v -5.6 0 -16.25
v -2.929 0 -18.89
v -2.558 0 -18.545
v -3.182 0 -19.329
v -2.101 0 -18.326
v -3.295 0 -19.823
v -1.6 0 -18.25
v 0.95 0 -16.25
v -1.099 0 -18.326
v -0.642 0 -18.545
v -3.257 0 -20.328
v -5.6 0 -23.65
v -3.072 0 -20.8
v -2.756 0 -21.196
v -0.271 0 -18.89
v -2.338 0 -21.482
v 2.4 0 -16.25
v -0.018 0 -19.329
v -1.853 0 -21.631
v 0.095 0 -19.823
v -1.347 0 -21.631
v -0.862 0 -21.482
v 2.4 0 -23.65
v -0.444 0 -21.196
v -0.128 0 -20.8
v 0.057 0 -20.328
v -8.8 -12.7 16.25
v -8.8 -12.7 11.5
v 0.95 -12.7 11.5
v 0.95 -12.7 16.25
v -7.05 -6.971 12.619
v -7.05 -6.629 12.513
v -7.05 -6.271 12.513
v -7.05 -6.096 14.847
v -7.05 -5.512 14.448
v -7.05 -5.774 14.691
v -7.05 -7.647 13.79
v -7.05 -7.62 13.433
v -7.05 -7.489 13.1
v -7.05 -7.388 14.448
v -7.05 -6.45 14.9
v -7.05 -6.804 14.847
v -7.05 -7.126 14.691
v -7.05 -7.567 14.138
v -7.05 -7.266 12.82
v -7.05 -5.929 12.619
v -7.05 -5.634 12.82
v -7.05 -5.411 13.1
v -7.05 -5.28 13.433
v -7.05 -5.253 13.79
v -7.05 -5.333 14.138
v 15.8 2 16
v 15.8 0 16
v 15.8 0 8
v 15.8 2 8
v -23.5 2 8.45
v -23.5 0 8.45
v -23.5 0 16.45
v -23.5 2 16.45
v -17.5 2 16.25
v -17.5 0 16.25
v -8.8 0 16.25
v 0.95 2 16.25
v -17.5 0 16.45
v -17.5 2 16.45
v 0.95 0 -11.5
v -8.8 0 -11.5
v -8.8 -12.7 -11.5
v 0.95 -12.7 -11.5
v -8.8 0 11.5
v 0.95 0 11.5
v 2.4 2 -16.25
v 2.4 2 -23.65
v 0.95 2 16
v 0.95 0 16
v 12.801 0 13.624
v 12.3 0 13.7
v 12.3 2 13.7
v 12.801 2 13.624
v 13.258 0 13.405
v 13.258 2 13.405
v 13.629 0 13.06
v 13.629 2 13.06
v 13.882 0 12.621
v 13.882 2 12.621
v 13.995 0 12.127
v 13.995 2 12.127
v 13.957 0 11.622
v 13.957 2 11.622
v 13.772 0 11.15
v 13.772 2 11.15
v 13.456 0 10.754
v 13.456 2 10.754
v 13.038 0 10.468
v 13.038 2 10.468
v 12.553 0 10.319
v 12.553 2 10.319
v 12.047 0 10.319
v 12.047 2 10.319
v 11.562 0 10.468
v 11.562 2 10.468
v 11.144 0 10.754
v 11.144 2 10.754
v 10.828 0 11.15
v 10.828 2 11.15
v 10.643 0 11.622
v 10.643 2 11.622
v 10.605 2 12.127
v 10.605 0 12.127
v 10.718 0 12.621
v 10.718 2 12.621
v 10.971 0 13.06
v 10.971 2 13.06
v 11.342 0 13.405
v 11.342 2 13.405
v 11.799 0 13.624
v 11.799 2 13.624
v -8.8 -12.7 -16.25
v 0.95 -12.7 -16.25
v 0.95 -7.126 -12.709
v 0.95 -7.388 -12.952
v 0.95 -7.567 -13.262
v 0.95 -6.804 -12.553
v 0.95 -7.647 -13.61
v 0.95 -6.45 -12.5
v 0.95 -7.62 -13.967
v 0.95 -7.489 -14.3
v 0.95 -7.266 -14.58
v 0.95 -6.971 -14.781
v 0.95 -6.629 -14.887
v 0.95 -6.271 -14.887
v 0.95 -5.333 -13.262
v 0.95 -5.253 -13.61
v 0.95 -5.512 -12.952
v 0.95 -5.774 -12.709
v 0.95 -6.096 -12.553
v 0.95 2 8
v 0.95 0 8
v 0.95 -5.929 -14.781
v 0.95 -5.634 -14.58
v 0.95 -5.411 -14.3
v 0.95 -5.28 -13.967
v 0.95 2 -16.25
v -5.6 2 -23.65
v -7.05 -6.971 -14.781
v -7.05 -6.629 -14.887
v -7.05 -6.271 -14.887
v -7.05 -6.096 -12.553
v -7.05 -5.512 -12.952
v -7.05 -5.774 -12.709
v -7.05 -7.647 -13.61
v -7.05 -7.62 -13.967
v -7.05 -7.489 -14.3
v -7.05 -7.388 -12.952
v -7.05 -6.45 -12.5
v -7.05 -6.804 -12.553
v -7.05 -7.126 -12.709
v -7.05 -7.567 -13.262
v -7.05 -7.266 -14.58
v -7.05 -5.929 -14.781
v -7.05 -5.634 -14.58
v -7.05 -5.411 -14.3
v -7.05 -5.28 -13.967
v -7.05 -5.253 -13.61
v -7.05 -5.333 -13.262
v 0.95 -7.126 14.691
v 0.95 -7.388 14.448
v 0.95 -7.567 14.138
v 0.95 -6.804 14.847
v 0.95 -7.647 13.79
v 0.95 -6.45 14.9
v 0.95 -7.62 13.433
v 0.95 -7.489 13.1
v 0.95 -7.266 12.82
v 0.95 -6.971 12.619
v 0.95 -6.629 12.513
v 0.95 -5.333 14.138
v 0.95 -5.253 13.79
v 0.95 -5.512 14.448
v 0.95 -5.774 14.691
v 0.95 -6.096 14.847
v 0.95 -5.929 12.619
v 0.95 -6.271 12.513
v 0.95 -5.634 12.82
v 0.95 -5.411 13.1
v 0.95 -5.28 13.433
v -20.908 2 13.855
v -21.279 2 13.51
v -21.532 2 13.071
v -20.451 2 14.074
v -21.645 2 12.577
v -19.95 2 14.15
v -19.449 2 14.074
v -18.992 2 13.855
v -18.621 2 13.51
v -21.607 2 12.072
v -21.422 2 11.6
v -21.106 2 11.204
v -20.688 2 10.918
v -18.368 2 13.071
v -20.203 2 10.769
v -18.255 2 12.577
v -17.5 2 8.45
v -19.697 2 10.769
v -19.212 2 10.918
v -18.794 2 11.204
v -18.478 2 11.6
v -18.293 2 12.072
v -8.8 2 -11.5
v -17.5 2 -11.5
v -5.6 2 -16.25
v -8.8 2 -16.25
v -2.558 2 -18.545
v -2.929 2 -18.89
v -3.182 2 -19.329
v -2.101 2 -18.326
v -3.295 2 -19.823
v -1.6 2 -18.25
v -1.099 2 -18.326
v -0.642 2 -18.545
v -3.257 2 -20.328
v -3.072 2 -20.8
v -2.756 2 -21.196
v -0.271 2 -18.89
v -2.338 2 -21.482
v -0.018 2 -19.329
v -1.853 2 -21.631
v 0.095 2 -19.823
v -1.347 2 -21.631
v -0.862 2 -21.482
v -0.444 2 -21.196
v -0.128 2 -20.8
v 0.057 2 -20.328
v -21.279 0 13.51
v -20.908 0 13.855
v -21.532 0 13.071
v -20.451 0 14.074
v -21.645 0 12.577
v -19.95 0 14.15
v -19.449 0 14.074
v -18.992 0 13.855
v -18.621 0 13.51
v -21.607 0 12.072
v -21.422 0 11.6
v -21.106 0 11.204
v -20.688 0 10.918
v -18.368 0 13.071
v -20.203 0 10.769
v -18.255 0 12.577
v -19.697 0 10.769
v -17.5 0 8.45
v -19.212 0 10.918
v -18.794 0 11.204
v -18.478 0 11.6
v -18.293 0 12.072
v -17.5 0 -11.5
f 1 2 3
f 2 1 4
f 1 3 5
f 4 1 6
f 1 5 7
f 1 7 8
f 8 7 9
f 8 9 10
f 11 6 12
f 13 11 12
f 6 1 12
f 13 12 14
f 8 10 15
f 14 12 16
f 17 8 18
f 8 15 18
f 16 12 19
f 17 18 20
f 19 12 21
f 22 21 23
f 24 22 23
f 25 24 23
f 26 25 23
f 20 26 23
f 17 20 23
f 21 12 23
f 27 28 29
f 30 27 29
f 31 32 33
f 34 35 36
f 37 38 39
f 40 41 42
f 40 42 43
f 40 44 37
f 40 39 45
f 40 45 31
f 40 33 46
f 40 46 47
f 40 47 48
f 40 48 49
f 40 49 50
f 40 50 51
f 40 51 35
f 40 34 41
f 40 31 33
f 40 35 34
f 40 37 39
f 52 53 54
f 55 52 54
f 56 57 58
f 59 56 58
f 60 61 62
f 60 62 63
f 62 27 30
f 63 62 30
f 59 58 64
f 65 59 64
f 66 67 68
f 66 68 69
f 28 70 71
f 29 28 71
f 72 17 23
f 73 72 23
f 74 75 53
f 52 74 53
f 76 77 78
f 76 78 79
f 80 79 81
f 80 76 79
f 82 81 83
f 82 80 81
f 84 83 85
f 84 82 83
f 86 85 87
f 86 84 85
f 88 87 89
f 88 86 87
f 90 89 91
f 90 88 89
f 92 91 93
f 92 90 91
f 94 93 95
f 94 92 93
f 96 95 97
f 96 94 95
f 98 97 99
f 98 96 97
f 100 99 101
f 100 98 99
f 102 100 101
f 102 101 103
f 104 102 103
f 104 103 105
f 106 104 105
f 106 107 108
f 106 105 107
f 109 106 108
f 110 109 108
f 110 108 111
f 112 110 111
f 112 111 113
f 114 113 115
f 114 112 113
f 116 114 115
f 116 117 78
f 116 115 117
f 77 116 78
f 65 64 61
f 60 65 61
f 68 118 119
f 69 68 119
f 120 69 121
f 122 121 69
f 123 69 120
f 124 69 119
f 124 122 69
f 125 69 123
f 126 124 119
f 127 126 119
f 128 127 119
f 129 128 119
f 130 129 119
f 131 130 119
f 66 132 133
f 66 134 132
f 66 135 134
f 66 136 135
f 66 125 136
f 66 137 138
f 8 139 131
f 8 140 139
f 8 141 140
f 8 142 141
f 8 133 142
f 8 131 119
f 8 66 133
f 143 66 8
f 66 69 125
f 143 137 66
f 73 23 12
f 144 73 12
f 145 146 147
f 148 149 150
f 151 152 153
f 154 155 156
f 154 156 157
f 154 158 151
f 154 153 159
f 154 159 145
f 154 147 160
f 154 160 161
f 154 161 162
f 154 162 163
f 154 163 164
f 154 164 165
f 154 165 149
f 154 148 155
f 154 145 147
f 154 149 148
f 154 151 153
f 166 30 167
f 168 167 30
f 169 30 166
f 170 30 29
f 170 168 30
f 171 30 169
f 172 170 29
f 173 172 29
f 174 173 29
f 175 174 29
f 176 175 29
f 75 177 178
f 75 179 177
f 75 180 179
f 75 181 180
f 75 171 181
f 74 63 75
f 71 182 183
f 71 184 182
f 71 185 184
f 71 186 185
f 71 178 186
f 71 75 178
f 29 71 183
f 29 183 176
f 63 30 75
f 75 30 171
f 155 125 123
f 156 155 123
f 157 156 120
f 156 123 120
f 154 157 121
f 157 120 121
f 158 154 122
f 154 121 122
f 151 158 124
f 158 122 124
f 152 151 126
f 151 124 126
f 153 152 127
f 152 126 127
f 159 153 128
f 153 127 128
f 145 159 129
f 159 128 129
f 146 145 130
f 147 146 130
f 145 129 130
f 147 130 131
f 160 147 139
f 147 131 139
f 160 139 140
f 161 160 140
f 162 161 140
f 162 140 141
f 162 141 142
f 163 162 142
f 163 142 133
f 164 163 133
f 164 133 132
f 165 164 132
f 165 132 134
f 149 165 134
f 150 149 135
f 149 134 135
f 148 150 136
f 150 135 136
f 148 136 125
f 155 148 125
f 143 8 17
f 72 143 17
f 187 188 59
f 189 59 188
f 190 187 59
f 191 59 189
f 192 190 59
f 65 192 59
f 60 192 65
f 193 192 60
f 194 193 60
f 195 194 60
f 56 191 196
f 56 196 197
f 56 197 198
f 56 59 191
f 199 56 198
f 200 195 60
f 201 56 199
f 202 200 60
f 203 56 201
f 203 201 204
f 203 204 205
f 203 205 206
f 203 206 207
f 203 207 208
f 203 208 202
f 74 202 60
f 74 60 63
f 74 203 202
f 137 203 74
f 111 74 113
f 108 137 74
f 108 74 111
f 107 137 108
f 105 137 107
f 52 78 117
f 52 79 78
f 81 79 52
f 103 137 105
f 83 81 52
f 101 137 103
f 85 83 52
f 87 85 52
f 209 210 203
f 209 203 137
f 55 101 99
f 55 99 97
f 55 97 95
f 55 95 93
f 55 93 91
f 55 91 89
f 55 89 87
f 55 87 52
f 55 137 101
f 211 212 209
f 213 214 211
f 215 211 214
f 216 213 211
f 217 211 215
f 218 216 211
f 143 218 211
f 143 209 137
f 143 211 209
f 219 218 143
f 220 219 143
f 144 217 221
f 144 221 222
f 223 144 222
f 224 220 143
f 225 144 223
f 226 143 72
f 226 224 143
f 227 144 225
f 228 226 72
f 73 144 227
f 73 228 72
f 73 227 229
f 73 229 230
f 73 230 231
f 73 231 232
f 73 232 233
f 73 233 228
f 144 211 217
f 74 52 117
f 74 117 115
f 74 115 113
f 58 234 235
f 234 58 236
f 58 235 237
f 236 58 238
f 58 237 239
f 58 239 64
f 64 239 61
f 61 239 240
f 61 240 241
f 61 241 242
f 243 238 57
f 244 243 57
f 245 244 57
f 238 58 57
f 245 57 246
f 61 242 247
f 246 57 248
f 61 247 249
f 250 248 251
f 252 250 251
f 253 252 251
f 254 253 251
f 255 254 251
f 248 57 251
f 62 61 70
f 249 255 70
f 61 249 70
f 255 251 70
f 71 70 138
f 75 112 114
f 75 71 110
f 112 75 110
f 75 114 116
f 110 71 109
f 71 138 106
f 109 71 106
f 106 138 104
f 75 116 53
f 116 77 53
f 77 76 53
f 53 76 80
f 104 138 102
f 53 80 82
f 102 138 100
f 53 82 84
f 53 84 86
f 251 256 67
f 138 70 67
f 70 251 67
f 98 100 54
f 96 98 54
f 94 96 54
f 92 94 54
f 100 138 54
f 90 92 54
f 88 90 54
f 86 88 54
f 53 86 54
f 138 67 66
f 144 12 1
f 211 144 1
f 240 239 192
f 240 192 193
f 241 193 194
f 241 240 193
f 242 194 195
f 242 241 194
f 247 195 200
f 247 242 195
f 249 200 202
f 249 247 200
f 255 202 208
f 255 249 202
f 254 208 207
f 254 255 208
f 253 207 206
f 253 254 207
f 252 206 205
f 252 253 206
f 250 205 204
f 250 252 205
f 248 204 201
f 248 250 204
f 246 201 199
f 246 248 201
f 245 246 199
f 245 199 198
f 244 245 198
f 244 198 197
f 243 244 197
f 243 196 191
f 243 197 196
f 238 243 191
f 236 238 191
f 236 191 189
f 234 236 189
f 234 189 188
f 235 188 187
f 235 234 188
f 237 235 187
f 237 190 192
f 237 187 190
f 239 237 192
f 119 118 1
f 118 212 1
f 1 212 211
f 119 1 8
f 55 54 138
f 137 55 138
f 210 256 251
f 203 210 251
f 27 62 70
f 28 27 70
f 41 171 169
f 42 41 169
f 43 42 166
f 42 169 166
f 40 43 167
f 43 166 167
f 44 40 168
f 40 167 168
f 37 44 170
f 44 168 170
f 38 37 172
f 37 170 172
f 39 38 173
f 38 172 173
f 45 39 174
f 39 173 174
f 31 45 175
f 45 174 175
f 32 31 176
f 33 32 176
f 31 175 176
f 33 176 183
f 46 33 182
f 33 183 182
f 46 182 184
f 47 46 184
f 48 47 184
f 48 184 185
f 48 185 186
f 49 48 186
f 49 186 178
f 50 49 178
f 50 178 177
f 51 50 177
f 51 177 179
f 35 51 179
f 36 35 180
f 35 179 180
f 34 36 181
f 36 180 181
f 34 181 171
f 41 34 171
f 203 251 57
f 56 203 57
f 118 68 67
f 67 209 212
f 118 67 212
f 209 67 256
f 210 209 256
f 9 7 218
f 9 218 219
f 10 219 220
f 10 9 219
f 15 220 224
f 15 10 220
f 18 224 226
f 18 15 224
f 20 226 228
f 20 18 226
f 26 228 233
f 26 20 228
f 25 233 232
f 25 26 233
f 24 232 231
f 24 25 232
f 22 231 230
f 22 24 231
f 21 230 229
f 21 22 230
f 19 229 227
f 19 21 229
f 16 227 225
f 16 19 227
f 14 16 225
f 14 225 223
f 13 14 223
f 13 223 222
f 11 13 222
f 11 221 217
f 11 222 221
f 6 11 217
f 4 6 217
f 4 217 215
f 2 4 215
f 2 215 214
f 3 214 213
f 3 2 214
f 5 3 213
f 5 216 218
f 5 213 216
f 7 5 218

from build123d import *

# Parameters (mm, degrees)
BOSS_EXTRUDE1_DEPTH     = 2
SKETCH1_5_W             = 9.75
SKETCH1_5_H             = 4.75
BOSS_EXTRUDE2_DEPTH     = 12.7
CUT_EXTRUDE1_DEPTH      = 36.677198601
CUT_EXTRUDE1_DEPTH_BACK = 36.677198601
SKETCH1_6_R             = 1.7
CUT_EXTRUDE2_START      = 0.95
SKETCH2_R               = 1.2
CUT_EXTRUDE2_DEPTH      = 8


with BuildPart() as part:
    # Sketch1 → Boss-Extrude1 (new body)
    with BuildSketch(Plane(origin=(0, 0, 0), x_dir=(1, 0, 0), z_dir=(0, 1, 0))):
        Polygon((0.95, 16.25), (2.4, 16.25), (2.4, 23.65), (-5.6, 23.65), (-5.6, 16.25), (-8.8, 16.25), (-8.8, 11.5), (-17.5, 11.5), (-17.5, -8.45), (-23.5, -8.45), (-23.5, -16.45), (-17.5, -16.45), (-17.5, -16.25), (0.95, -16.25), (0.95, -16), (15.8, -16), (15.8, -8), (0.95, -8), align=None)
    extrude(amount=BOSS_EXTRUDE1_DEPTH)

    # Sketch1<5> → Boss-Extrude2 (add)
    with BuildSketch(Plane(origin=(0, 0, 0), x_dir=(1, 0, 0), z_dir=(0, 1, 0))):
        with Locations((-3.925, 13.875)):
            Rectangle(SKETCH1_5_W, SKETCH1_5_H)
        with Locations((-3.925, -13.875)):
            Rectangle(SKETCH1_5_W, SKETCH1_5_H)
    extrude(amount=-BOSS_EXTRUDE2_DEPTH)

    # Sketch1<6> → Cut-Extrude1 (cut, two sides: drawn at the far end of the back side and taken through both)
    with BuildSketch(Plane(origin=(0, 0, 0), x_dir=(1, 0, 0), z_dir=(0, 1, 0)).offset(-CUT_EXTRUDE1_DEPTH_BACK)):
        with Locations(Location((-1.6, 19.95, 0), (0, 0, 270))):
            Circle(SKETCH1_6_R)
        with Locations(Location((12.3, -12, 0), (0, 0, 270))):
            Circle(SKETCH1_6_R)
        with Locations(Location((-19.95, -12.45, 0), (0, 0, 270))):
            Circle(SKETCH1_6_R)
    extrude(amount=CUT_EXTRUDE1_DEPTH + CUT_EXTRUDE1_DEPTH_BACK, mode=Mode.SUBTRACT)

    # Sketch2 → Cut-Extrude2 (cut)
    with BuildSketch(Plane(origin=(0, 0, 0), x_dir=(0, 0, -1), z_dir=(1, 0, 0)).offset(CUT_EXTRUDE2_START)):
        with Locations(Location((-13.7, -6.45, 0), (0, 0, 180))):
            Circle(SKETCH2_R)
        with Locations(Location((13.7, -6.45, 0), (0, 0, 180))):
            Circle(SKETCH2_R)
    extrude(amount=-CUT_EXTRUDE2_DEPTH, mode=Mode.SUBTRACT)


solid = part.part
